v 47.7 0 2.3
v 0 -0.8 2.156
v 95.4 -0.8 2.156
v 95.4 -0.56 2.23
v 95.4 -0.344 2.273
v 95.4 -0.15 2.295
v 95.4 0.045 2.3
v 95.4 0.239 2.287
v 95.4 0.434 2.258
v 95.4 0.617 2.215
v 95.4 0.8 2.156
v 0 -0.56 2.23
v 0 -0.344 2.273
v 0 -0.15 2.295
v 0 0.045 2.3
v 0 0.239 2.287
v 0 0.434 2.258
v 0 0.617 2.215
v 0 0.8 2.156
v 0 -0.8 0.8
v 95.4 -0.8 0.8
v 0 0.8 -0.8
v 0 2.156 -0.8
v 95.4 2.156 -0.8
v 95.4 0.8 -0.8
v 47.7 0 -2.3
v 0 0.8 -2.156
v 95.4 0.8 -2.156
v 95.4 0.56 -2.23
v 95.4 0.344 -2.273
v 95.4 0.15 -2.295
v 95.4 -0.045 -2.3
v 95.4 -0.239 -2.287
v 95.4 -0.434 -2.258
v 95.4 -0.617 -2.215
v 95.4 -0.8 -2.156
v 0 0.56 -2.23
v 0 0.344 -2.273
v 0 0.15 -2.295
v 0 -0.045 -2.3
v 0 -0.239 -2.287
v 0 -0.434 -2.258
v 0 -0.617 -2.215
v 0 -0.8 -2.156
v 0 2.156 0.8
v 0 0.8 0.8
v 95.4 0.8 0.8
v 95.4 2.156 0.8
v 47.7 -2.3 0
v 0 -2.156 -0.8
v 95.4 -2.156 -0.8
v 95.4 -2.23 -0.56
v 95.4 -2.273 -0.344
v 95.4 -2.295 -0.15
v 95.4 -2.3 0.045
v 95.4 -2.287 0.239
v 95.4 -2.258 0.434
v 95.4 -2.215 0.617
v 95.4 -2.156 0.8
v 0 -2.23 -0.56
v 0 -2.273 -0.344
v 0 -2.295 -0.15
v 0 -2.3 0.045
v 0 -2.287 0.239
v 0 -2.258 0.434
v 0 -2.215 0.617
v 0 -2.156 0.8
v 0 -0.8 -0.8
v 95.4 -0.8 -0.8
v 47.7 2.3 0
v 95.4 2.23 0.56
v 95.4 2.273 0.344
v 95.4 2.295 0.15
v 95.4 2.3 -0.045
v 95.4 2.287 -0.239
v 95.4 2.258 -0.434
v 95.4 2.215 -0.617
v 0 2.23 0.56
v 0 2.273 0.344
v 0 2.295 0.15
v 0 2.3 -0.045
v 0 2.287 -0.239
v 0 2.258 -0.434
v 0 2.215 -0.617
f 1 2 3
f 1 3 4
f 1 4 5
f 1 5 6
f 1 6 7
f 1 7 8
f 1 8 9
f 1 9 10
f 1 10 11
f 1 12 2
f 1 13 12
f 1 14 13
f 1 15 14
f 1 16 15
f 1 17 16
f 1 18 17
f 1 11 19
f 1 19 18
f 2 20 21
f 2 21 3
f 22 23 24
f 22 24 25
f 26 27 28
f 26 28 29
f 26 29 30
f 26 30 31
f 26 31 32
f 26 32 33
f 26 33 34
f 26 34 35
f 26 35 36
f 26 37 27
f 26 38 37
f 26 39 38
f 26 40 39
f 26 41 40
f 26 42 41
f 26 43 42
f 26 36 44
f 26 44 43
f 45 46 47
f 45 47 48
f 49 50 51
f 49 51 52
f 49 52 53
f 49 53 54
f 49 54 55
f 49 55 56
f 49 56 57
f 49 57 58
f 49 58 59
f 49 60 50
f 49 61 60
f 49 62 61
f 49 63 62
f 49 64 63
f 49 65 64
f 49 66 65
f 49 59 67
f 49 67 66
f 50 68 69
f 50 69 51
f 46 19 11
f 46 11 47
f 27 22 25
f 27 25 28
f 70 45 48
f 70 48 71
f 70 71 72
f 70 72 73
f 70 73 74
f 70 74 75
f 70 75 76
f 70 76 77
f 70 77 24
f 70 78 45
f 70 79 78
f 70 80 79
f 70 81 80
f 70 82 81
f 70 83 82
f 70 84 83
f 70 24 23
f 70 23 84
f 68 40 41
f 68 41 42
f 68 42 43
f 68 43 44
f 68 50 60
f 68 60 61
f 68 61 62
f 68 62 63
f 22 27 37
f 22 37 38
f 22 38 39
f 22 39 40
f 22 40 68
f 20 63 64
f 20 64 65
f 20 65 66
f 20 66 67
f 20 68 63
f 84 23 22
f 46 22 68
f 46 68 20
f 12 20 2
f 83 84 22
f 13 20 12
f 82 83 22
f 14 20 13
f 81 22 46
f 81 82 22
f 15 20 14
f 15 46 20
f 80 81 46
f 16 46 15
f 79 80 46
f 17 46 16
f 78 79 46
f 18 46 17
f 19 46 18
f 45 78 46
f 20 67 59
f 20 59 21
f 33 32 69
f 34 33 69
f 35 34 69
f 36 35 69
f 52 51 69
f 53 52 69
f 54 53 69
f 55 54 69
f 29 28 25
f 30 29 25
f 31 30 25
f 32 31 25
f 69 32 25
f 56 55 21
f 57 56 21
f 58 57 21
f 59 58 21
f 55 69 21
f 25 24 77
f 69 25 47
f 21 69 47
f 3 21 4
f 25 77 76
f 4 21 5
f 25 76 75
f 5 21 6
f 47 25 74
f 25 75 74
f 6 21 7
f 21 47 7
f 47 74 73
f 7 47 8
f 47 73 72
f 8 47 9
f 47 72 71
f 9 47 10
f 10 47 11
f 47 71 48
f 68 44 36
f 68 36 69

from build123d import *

# Parameters (mm, degrees)
BOSS_EXTRUDE1_DEPTH = 95.4


with BuildPart() as part:
    # Sketch1 → Boss-Extrude1 (new body)
    with BuildSketch(Plane(origin=(0, 0, 0), x_dir=(0, 0, -1), z_dir=(1, 0, 0))):
        with BuildLine():
            Line((-2.156385865, 0.8), (-0.8, 0.8))
            Line((-0.8, 0.8), (-0.8, 2.156385865))
            add(Edge.make_bspline(
                [(-0.8, 2.156385865), (0, 2.443614135), (0.8, 2.156385865)],
                knots=[0, 0, 0, 1, 1, 1], degree=2))
            Line((0.8, 2.156385865), (0.8, 0.8))
            Line((0.8, 0.8), (2.156385865, 0.8))
            add(Edge.make_bspline(
                [(2.156385865, 0.8), (2.443614135, 0), (2.156385865, -0.8)],
                knots=[0, 0, 0, 1, 1, 1], degree=2))
            Line((2.156385865, -0.8), (0.8, -0.8))
            Line((0.8, -0.8), (0.8, -2.156385865))
            add(Edge.make_bspline(
                [(0.8, -2.156385865), (0, -2.443614135), (-0.8, -2.156385865)],
                knots=[0, 0, 0, 1, 1, 1], degree=2))
            Line((-0.8, -2.156385865), (-0.8, -0.8))
            Line((-0.8, -0.8), (-2.156385865, -0.8))
            add(Edge.make_bspline(
                [(-2.156385865, -0.8), (-2.443614135, 0), (-2.156385865, 0.8)],
                knots=[0, 0, 0, 1, 1, 1], degree=2))
        make_face()
    extrude(amount=BOSS_EXTRUDE1_DEPTH)


solid = part.part
